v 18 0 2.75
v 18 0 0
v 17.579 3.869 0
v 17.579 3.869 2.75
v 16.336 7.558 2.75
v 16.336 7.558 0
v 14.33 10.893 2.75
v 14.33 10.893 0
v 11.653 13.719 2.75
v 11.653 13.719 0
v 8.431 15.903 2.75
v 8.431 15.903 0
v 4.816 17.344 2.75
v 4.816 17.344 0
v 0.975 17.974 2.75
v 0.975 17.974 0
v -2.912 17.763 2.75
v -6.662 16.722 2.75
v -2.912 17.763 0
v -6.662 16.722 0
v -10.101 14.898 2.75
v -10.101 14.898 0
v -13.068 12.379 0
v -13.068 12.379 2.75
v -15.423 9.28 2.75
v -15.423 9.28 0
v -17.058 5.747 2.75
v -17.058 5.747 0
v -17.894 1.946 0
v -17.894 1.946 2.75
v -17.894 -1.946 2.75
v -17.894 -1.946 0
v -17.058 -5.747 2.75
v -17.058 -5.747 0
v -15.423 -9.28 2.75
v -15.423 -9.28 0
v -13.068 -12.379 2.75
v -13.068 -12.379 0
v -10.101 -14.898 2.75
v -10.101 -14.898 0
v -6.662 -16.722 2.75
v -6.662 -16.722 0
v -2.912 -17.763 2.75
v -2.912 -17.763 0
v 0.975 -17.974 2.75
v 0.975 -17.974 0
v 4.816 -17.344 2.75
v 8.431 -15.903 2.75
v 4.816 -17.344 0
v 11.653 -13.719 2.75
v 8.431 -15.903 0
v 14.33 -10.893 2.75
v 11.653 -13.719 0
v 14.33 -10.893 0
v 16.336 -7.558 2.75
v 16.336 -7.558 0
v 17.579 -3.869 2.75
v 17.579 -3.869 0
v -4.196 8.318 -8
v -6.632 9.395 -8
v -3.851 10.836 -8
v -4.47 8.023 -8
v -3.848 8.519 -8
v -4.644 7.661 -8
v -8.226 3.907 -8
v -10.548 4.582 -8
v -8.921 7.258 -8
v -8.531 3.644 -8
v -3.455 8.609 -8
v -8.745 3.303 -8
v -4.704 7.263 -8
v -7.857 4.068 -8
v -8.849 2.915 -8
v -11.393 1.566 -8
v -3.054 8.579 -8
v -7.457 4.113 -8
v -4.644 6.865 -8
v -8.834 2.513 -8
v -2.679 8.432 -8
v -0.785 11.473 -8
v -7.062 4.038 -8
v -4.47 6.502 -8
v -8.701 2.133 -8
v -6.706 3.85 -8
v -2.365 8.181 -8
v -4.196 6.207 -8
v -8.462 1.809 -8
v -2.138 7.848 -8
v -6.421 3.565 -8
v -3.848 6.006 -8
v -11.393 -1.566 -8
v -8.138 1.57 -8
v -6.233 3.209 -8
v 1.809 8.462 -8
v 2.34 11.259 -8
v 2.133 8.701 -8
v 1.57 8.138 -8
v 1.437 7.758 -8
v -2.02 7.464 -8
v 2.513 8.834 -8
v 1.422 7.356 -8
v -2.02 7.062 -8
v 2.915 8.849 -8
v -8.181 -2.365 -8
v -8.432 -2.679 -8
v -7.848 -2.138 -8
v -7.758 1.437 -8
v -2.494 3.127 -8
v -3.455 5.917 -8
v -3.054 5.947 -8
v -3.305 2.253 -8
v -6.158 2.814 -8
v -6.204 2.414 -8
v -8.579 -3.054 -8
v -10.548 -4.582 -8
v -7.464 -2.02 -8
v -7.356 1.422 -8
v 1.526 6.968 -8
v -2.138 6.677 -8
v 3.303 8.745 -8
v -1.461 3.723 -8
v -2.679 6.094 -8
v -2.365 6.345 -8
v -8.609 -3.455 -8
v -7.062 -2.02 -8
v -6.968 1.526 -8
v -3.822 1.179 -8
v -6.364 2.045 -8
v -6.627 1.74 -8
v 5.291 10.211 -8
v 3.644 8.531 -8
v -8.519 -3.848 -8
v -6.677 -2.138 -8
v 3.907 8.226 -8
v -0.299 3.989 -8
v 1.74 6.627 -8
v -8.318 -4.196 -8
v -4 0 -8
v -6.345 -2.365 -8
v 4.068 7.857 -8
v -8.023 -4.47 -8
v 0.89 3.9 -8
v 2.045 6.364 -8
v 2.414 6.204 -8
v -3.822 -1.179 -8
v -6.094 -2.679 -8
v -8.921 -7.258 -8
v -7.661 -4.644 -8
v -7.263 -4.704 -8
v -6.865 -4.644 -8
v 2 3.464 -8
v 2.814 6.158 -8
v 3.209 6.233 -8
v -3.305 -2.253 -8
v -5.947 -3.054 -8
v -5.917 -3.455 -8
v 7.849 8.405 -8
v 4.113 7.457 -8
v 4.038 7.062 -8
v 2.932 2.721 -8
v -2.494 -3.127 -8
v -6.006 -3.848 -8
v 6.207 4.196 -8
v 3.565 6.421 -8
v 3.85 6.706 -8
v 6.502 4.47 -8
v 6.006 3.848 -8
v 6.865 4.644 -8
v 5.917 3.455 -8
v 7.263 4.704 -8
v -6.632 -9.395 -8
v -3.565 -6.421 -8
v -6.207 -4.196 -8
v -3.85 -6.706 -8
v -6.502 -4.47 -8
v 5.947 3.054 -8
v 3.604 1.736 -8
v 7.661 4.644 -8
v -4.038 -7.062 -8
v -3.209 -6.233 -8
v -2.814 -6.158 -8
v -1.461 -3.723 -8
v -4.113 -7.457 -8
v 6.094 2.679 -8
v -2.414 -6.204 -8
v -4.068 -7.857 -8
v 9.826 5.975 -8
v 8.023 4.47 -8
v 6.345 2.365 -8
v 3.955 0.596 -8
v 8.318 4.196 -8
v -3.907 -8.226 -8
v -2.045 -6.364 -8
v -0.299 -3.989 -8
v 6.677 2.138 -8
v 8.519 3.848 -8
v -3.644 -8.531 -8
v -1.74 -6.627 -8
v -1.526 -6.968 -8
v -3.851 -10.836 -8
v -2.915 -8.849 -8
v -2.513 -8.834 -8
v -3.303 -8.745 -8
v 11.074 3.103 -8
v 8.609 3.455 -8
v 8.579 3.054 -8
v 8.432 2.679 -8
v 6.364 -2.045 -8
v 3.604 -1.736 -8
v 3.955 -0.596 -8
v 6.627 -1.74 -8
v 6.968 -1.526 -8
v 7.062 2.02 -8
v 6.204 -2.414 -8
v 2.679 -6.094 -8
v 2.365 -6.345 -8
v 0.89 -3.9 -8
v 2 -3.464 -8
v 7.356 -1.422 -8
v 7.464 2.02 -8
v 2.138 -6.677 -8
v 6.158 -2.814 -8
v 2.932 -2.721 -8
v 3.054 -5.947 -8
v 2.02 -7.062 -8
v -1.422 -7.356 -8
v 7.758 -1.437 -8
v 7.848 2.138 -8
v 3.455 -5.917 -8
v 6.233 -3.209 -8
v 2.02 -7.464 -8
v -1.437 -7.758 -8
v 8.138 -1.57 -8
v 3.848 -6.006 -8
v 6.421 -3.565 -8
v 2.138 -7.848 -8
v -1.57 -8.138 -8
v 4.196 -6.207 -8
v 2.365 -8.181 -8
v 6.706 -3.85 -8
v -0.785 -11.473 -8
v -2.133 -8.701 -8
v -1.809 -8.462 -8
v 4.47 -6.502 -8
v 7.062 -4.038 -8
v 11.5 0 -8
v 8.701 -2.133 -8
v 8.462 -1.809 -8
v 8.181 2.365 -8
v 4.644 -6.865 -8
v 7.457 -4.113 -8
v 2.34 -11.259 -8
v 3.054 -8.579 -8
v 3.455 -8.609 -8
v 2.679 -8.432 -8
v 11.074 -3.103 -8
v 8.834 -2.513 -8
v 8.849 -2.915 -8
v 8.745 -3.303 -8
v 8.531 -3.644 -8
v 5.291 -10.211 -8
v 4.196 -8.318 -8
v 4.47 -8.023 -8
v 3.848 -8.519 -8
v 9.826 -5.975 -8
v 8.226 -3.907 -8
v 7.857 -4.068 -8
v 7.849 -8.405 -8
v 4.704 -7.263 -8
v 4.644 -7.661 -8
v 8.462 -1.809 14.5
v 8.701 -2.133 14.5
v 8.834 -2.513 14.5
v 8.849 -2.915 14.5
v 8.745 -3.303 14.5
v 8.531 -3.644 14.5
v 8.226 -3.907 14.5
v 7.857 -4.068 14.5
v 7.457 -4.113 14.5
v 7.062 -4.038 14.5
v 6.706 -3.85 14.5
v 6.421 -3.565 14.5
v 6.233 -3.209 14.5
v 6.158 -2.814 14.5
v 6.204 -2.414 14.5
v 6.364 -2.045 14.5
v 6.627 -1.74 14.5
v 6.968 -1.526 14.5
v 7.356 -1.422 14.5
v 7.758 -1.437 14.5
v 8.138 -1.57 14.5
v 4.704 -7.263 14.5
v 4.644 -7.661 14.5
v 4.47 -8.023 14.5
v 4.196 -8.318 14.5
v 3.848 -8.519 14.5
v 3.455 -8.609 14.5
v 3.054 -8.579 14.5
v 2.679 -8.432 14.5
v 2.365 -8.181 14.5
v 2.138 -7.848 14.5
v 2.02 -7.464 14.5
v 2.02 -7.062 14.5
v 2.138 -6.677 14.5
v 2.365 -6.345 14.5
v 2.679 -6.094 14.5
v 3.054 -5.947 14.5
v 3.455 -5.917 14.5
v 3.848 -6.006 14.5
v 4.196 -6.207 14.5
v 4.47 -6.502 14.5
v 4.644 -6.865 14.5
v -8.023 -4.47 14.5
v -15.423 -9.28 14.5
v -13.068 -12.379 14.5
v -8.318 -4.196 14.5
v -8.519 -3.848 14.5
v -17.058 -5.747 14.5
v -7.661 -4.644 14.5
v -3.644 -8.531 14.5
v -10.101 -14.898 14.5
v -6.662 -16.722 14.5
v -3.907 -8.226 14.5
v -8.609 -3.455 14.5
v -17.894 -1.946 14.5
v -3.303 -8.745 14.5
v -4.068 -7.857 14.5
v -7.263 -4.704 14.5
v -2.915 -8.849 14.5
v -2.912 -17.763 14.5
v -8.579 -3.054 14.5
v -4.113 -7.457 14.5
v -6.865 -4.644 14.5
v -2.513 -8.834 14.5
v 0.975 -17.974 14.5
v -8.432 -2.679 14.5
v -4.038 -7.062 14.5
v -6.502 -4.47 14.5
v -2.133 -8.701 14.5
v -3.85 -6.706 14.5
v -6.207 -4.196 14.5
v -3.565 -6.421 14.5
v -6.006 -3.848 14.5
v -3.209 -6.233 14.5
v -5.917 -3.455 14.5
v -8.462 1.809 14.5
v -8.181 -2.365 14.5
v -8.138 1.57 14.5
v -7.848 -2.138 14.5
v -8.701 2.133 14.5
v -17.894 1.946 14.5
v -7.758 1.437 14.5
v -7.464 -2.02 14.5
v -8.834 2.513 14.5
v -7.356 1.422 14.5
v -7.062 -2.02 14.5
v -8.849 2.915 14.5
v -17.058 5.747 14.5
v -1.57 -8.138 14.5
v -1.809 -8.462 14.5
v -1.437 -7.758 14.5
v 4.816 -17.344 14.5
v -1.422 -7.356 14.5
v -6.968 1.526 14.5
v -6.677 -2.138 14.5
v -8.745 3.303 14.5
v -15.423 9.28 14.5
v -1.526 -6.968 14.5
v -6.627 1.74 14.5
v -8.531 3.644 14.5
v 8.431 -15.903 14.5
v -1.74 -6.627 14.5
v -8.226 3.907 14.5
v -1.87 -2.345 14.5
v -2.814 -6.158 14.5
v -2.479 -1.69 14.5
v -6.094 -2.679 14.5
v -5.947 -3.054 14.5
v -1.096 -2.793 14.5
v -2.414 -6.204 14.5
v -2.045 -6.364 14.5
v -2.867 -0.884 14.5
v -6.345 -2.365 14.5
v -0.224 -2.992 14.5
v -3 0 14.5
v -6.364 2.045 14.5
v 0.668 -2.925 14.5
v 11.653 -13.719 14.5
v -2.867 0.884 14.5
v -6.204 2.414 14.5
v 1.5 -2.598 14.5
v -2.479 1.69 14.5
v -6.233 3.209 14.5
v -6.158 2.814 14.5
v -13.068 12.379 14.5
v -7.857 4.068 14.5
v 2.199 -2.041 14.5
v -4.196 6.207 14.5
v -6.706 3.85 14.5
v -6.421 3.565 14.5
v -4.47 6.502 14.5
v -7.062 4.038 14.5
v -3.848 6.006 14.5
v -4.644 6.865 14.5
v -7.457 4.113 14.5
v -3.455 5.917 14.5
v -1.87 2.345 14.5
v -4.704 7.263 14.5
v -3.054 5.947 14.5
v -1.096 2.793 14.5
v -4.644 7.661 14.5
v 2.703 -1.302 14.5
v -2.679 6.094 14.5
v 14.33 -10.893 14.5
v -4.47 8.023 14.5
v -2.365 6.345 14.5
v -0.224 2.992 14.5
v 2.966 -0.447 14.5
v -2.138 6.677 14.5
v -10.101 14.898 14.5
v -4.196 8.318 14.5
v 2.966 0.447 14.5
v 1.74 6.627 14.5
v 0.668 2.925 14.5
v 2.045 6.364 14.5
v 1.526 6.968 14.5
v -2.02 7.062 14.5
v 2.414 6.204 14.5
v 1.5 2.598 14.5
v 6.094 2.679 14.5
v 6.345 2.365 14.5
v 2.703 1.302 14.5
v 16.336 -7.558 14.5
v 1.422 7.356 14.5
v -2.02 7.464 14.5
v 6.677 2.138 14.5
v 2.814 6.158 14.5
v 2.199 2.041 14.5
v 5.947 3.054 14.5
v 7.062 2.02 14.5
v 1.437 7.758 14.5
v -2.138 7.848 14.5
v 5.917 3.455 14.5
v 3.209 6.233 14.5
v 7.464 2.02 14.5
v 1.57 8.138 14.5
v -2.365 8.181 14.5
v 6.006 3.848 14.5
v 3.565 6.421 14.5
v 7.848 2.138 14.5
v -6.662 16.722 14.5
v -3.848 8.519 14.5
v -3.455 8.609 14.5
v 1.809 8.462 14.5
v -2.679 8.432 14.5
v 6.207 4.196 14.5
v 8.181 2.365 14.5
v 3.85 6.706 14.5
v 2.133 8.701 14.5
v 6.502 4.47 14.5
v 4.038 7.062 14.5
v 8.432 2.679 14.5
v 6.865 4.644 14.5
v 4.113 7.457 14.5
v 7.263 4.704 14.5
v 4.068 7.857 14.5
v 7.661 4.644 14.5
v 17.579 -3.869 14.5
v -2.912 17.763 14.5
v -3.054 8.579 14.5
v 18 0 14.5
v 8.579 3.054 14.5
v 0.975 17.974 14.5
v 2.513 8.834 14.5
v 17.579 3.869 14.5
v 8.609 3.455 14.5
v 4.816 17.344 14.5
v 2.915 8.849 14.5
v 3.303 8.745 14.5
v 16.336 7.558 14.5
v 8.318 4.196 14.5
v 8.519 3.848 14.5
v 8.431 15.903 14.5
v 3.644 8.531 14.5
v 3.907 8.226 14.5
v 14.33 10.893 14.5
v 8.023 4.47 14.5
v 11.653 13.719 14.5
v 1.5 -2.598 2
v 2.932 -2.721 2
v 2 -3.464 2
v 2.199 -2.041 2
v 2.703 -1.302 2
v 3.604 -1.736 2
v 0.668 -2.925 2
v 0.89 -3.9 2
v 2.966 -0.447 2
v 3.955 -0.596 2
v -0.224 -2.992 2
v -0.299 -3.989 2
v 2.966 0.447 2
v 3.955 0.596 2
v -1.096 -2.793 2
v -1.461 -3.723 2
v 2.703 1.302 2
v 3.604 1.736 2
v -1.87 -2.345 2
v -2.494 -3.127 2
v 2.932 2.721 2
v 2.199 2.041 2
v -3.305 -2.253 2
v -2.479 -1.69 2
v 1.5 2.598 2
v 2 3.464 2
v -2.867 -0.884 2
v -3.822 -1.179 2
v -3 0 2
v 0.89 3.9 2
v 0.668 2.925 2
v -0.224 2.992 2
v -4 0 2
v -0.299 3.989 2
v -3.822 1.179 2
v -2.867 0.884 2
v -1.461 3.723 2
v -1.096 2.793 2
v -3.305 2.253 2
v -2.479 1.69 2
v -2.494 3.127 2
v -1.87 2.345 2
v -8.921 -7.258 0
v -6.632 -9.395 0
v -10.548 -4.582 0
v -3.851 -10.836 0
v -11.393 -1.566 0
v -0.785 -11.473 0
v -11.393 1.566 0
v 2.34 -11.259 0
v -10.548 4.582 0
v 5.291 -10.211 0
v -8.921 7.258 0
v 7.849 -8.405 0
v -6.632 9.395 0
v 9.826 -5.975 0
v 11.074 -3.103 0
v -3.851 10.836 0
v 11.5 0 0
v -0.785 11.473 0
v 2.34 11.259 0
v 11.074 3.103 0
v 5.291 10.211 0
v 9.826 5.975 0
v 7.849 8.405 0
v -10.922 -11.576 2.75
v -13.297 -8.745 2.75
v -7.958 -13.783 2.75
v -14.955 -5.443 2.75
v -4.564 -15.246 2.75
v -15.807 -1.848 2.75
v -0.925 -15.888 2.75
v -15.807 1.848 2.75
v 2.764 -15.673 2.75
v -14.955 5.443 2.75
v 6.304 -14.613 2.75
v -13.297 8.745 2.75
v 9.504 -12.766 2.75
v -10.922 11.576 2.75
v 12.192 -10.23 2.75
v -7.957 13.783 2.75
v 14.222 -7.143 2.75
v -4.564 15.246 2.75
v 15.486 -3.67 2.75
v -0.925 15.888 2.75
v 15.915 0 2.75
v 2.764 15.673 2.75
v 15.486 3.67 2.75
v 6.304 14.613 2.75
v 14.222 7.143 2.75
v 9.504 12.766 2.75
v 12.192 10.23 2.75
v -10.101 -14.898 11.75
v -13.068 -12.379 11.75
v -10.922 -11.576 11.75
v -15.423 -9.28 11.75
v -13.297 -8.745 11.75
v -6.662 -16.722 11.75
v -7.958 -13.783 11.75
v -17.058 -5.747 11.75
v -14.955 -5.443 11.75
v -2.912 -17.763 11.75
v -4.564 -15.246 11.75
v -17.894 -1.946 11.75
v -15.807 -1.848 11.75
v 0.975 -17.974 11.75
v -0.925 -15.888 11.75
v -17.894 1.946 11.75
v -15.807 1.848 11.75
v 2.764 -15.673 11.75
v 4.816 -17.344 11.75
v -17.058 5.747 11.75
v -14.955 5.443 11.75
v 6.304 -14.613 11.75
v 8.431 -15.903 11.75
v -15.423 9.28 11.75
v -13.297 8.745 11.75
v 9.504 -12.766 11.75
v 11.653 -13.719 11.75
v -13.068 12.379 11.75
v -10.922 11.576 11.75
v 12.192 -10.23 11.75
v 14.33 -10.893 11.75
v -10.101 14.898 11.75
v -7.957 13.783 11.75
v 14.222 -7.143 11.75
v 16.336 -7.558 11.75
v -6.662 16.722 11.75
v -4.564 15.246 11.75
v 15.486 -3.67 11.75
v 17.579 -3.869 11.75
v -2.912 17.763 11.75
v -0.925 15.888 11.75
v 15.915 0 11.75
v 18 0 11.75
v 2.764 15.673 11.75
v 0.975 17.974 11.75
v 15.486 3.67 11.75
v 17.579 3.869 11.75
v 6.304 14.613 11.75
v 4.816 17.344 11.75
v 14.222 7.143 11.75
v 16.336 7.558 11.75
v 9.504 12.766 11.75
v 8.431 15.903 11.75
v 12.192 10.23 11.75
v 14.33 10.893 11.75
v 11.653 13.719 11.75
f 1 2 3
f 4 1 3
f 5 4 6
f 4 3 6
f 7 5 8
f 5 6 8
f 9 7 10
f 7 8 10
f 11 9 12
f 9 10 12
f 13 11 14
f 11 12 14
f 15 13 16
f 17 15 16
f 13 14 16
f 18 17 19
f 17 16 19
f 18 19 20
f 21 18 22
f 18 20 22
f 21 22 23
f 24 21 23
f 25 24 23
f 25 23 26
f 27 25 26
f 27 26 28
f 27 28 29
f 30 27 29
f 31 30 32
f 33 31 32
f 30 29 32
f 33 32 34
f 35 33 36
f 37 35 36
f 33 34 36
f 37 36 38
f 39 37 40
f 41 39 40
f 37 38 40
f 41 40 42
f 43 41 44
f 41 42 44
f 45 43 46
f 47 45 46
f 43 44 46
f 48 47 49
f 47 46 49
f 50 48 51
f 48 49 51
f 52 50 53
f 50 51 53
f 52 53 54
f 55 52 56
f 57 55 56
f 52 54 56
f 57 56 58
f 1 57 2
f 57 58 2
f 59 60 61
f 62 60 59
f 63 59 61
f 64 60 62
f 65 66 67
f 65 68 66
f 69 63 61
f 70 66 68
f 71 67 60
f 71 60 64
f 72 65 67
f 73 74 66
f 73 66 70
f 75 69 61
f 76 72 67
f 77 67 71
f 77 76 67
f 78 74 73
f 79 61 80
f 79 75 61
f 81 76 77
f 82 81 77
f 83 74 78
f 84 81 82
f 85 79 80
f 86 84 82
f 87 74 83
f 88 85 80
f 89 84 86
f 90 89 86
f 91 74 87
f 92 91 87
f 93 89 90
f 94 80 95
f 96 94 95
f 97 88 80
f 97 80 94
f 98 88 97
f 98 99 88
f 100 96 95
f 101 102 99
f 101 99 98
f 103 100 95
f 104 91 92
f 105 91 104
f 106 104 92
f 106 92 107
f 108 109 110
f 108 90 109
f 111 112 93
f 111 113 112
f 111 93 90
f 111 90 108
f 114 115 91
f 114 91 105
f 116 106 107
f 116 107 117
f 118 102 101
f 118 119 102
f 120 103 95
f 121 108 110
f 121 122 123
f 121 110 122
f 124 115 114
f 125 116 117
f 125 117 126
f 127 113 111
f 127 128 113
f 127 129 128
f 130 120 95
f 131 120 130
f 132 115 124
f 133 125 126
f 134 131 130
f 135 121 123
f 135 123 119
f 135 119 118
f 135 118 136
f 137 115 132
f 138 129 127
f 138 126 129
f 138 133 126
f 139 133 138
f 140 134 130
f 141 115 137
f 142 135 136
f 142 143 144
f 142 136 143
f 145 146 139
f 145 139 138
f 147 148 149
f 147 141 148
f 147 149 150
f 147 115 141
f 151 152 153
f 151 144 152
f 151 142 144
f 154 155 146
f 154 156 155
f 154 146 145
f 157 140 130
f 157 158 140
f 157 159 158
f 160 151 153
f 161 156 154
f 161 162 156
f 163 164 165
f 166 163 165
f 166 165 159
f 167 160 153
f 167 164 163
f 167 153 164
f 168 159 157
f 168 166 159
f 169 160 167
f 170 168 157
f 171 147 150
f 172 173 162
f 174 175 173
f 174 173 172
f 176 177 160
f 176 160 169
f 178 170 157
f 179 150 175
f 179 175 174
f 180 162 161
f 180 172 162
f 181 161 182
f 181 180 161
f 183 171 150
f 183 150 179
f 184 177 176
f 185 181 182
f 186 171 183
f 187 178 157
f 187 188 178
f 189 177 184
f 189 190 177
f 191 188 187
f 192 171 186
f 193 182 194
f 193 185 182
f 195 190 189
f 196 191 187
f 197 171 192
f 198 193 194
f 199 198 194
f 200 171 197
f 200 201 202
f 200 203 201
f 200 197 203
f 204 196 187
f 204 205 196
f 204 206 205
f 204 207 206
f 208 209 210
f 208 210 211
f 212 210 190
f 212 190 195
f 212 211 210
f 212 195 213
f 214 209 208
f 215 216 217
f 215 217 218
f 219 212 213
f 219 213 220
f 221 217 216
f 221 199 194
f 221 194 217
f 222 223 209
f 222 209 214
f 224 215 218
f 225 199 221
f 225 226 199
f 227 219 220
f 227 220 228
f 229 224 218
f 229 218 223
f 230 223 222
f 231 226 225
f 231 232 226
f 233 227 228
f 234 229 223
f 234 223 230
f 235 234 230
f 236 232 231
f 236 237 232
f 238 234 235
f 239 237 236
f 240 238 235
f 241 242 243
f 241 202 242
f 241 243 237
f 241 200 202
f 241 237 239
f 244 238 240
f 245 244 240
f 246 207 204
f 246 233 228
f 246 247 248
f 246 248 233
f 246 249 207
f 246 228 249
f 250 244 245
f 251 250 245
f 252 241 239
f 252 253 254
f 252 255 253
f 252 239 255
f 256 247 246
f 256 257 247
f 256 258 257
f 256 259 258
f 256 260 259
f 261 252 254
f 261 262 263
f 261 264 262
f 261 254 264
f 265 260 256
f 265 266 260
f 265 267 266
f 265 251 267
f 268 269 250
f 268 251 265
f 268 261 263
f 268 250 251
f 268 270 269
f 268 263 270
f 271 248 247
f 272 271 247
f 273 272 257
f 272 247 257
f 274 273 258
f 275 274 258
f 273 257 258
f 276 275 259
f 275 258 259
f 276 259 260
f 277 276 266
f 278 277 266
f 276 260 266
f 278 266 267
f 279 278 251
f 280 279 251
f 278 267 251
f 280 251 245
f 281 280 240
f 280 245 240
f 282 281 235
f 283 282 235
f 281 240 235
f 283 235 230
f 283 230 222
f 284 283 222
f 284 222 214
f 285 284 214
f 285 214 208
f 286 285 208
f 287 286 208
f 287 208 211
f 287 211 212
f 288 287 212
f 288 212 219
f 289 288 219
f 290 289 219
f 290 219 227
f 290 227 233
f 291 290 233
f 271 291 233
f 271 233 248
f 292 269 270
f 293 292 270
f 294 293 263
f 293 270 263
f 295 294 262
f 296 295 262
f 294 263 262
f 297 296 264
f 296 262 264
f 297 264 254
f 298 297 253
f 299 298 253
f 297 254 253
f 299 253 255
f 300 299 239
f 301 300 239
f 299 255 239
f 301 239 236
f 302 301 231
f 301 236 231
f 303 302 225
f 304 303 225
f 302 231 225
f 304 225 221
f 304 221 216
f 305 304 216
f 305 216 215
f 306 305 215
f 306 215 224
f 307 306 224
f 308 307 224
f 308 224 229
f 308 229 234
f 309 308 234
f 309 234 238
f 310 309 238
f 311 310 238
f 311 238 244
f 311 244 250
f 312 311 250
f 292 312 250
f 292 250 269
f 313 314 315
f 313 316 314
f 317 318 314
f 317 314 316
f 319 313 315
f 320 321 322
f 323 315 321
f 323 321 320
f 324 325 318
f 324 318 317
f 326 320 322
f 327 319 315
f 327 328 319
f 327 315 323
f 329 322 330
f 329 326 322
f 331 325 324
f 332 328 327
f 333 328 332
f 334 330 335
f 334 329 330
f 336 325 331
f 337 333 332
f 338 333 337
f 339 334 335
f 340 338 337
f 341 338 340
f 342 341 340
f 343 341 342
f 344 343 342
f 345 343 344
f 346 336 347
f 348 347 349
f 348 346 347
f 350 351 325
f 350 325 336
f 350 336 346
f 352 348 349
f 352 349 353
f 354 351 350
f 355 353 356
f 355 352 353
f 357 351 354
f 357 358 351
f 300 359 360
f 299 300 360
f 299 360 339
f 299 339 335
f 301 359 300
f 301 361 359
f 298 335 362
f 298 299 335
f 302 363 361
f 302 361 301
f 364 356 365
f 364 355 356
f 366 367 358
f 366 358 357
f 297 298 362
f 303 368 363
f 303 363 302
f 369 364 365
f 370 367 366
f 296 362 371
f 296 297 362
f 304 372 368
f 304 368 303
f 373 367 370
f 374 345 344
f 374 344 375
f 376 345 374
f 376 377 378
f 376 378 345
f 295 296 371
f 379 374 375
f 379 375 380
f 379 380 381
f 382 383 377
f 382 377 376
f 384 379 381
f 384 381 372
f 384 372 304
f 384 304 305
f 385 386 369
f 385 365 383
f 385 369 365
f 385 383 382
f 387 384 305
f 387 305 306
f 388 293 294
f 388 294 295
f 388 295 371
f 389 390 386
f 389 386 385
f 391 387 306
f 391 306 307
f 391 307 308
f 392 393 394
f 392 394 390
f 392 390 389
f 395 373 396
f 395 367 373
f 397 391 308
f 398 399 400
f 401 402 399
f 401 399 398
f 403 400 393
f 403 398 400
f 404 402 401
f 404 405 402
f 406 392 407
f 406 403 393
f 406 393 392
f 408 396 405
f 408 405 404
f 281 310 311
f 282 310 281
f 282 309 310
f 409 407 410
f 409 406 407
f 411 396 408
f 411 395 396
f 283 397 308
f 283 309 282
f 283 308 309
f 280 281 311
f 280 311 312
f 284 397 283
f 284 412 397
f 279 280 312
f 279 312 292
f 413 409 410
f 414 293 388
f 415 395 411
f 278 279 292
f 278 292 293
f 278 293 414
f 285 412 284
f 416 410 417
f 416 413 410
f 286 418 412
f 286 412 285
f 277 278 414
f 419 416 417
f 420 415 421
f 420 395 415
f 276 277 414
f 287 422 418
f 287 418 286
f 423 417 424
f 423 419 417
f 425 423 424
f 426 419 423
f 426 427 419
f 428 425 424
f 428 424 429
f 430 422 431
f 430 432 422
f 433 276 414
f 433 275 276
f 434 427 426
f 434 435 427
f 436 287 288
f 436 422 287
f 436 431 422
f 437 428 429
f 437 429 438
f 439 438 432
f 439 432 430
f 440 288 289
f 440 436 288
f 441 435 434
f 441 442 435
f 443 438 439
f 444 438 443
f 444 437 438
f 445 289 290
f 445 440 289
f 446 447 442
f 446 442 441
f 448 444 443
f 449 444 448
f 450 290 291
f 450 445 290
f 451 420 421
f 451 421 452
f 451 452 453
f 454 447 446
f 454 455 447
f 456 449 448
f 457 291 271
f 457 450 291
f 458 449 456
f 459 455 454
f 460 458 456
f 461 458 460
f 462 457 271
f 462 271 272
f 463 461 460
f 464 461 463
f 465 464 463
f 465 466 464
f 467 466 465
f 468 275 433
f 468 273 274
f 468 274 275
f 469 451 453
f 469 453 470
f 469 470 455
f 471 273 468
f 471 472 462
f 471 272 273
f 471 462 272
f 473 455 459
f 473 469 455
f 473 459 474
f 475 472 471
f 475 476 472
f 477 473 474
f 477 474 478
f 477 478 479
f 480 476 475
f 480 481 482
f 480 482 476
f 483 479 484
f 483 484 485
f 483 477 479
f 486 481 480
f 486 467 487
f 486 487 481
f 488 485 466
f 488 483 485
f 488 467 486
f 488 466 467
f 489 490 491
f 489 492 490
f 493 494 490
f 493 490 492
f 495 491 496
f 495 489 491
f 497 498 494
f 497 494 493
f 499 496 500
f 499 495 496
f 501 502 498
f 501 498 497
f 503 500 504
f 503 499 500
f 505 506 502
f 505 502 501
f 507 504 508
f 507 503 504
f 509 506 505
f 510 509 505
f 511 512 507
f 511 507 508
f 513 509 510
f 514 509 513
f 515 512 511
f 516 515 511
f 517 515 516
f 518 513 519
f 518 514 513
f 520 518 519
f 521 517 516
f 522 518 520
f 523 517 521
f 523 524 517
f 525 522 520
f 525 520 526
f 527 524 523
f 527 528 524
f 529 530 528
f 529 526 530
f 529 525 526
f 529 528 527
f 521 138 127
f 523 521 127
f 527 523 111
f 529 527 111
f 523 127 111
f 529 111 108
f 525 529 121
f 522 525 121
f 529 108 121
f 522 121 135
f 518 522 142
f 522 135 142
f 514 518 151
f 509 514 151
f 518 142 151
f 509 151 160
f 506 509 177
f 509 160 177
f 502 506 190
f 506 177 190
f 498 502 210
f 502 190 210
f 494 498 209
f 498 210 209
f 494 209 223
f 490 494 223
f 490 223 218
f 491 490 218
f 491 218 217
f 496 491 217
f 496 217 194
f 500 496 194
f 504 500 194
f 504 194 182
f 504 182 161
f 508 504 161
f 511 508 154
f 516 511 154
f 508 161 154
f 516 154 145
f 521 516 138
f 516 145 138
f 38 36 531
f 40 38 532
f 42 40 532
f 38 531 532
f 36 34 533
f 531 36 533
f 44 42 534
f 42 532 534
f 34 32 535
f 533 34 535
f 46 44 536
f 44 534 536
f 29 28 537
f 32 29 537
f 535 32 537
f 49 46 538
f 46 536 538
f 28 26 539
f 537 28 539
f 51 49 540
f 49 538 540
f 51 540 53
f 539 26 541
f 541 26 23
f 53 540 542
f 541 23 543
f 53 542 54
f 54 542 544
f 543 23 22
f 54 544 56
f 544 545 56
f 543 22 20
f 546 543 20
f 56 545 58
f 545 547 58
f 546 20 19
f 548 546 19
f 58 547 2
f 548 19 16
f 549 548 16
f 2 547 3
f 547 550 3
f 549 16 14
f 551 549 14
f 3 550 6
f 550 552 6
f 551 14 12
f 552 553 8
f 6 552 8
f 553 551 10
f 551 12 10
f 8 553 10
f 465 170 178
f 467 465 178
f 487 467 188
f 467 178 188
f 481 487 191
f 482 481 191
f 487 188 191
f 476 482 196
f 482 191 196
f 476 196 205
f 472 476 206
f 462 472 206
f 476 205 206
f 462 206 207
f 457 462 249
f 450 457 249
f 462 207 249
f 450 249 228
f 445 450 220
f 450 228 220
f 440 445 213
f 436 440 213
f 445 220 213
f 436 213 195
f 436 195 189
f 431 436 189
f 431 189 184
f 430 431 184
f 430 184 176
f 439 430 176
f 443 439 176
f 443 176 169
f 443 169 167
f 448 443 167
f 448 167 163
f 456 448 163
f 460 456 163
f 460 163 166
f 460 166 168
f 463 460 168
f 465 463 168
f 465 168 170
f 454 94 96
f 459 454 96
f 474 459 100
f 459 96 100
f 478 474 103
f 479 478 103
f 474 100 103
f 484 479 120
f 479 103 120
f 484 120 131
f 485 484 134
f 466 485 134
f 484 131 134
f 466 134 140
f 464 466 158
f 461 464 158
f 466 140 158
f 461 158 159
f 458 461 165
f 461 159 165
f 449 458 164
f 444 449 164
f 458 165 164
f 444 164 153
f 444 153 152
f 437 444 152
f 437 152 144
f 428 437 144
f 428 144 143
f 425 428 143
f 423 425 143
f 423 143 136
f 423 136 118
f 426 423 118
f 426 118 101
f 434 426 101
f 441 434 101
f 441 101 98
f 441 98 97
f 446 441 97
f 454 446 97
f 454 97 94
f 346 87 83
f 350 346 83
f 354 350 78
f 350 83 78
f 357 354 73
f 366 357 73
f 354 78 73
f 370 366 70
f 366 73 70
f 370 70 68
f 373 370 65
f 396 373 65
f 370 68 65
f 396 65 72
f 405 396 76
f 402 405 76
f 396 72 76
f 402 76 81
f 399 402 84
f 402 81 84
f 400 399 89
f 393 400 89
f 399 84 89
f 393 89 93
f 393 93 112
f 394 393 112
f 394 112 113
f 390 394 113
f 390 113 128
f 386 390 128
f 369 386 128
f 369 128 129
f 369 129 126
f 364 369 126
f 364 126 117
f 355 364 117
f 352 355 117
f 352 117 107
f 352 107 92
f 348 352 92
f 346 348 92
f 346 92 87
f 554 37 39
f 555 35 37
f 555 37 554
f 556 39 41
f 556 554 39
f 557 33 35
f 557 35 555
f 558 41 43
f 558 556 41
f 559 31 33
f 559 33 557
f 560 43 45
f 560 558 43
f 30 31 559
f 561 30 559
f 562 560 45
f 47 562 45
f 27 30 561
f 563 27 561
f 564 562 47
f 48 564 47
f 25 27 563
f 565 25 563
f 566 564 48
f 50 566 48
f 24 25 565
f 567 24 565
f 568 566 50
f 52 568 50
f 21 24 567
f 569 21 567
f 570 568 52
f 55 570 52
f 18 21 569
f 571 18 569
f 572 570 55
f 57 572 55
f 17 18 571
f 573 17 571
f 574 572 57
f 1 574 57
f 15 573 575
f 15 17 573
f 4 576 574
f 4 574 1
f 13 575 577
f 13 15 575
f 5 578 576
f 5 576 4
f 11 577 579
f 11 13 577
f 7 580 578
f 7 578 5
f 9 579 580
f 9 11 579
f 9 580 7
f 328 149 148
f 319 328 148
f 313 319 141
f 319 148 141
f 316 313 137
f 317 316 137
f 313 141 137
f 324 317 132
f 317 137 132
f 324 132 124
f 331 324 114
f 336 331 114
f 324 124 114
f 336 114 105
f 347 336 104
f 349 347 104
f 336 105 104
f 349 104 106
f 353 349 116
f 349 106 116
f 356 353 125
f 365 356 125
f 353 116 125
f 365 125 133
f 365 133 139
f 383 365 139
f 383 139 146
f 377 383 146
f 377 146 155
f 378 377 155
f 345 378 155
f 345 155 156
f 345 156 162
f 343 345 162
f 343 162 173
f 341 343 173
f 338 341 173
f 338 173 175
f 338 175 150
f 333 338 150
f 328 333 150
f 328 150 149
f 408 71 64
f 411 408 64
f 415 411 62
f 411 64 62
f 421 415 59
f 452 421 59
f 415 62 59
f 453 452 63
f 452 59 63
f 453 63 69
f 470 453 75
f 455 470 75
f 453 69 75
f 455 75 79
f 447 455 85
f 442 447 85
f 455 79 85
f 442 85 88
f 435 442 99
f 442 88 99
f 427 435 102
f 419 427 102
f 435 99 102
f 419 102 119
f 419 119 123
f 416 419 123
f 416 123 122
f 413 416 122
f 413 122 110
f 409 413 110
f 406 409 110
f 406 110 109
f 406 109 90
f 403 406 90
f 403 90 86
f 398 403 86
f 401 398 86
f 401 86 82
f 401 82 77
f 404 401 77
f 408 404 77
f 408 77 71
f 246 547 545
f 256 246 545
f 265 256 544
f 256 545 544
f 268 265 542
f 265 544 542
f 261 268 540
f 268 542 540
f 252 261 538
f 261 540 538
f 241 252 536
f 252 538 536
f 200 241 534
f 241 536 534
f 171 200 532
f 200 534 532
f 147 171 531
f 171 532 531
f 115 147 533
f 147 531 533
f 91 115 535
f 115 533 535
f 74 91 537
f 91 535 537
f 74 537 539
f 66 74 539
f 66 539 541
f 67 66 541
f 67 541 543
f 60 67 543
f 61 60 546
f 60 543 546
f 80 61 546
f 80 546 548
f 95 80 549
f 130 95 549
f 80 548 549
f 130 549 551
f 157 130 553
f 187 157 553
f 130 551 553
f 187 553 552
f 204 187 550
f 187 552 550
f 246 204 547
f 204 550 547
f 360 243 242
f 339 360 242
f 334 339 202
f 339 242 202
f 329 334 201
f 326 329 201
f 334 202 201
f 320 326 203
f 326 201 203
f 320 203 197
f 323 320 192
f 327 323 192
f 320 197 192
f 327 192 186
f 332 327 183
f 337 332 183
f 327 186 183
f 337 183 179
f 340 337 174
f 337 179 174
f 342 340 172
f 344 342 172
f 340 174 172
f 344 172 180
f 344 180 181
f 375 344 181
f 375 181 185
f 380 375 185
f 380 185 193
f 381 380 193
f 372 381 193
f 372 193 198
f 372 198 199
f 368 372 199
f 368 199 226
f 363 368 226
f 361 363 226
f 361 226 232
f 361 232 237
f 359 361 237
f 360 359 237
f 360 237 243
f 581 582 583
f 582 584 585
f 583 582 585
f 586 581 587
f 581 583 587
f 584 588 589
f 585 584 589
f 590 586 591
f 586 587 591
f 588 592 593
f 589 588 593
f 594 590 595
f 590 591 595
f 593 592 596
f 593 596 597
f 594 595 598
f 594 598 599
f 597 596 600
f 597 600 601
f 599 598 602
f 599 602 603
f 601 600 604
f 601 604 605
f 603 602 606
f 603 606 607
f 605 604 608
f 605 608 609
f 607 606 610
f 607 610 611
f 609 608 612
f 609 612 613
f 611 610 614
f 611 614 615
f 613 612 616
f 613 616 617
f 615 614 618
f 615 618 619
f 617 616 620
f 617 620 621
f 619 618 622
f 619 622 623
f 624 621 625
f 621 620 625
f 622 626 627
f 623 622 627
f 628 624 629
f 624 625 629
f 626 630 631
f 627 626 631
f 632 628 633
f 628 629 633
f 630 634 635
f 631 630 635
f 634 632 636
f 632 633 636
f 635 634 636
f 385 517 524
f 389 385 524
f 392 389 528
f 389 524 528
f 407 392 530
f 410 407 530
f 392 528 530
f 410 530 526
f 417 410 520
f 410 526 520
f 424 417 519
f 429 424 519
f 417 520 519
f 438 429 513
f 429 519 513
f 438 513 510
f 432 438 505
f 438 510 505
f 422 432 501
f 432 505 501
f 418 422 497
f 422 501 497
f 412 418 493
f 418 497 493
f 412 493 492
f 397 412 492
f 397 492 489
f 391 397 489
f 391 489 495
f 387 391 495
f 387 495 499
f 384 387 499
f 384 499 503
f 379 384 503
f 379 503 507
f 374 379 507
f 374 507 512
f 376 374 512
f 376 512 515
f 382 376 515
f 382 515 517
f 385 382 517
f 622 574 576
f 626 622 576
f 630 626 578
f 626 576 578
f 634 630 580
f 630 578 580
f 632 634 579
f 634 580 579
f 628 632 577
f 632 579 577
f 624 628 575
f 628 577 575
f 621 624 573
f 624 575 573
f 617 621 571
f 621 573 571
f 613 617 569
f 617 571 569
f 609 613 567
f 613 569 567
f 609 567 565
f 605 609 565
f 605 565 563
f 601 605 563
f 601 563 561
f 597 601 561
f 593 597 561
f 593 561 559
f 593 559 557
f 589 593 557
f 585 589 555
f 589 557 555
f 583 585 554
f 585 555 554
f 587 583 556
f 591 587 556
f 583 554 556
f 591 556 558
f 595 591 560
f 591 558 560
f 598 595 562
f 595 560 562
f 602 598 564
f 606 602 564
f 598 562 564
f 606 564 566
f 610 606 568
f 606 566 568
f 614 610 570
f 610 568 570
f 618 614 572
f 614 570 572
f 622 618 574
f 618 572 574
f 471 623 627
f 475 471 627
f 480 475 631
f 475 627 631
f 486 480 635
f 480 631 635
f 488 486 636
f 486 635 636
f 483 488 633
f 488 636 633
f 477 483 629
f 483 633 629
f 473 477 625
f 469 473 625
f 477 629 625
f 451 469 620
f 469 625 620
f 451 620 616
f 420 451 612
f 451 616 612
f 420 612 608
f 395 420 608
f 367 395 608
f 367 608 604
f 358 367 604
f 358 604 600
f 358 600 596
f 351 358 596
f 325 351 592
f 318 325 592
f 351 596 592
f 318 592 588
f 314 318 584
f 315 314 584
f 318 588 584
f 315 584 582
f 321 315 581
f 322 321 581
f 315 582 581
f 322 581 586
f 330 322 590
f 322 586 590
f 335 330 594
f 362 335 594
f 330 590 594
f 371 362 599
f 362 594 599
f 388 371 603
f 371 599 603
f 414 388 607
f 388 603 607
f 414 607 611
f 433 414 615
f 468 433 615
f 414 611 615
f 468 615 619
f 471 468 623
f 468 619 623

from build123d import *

# Parameters (mm, degrees)
ESQUISSE1_R                  = 18
BOSS_EXTRU_2_DEPTH           = 2.75
ESQUISSE2_R                  = 15.915
BOSS_EXTRU_3_DEPTH           = 9
ESQUISSE3_R                  = 18
BOSS_EXTRU_4_DEPTH           = 2.75
ESQUISSE4_R                  = 11.5
BOSS_EXTRU_5_DEPTH           = 8
ESQUISSE5_R                  = 3
ENL_V_MAT_EXTRU_1_DEPTH      = 23.5
ESQUISSE6_R                  = 4
ENL_V_MAT_EXTRU_2_DEPTH      = 10
ESQUISSE7_R                  = 1.35
ENL_V_MAT_EXTRU_3_DEPTH      = 23.5
R_P_TITION_CIRCULAIRE1_COUNT = 8


with BuildPart() as part:
    # Esquisse1 → Boss.-Extru.2 (new body)
    with BuildSketch(Plane.XY):
        Circle(ESQUISSE1_R)
    extrude(amount=BOSS_EXTRU_2_DEPTH)

    # Esquisse2 → Boss.-Extru.3 (add)
    with BuildSketch(Plane.XY.offset(2.75)):
        Circle(ESQUISSE2_R)
    extrude(amount=BOSS_EXTRU_3_DEPTH)

    # Esquisse3 → Boss.-Extru.4 (add)
    with BuildSketch(Plane.XY.offset(11.75)):
        Circle(ESQUISSE3_R)
    extrude(amount=BOSS_EXTRU_4_DEPTH)

    # Esquisse4 → Boss.-Extru.5 (add)
    with BuildSketch(Plane(origin=(0, 0, 0), x_dir=(-1, 0, 0), z_dir=(0, 0, -1))):
        with Locations(Location((0, 0, 0), (0, 0, 180))):  # turned: the seam where the file's is
            Circle(ESQUISSE4_R)
    extrude(amount=BOSS_EXTRU_5_DEPTH)

    # Esquisse5 → Enlèv. mat.-Extru.1 (cut, through all)
    with BuildSketch(Plane(origin=(0, 0, -8), x_dir=(-1, 0, 0), z_dir=(0, 0, -1))):
        Circle(ESQUISSE5_R)
    extrude(amount=-ENL_V_MAT_EXTRU_1_DEPTH, mode=Mode.SUBTRACT)

    # Esquisse6 → Enlèv. mat.-Extru.2 (cut)
    with BuildSketch(Plane(origin=(0, 0, -8), x_dir=(-1, 0, 0), z_dir=(0, 0, -1))):
        Circle(ESQUISSE6_R)
    extrude(amount=-ENL_V_MAT_EXTRU_2_DEPTH, mode=Mode.SUBTRACT)

    # Esquisse7 → Enlèv. mat.-Extru.3 (cut, through all)
    with BuildSketch(Plane(origin=(0, 0, -8), x_dir=(-1, 0, 0), z_dir=(0, 0, -1))):
        with Locations((3.354474935, 7.26274727)):
            Circle(ESQUISSE7_R)
    enl_v_mat_extru_3 = extrude(amount=-ENL_V_MAT_EXTRU_3_DEPTH, mode=Mode.SUBTRACT)

    # Répétition circulaire1: Enlèv. mat.-Extru.3 ×8 about axis
    r_p_tition_circulaire1_axis = Axis((0, 0, 0), (0, 0, 1))
    for i in range(1, R_P_TITION_CIRCULAIRE1_COUNT):
        add(enl_v_mat_extru_3.rotate(r_p_tition_circulaire1_axis, i * 360 / R_P_TITION_CIRCULAIRE1_COUNT), mode=Mode.SUBTRACT)


solid = part.part
